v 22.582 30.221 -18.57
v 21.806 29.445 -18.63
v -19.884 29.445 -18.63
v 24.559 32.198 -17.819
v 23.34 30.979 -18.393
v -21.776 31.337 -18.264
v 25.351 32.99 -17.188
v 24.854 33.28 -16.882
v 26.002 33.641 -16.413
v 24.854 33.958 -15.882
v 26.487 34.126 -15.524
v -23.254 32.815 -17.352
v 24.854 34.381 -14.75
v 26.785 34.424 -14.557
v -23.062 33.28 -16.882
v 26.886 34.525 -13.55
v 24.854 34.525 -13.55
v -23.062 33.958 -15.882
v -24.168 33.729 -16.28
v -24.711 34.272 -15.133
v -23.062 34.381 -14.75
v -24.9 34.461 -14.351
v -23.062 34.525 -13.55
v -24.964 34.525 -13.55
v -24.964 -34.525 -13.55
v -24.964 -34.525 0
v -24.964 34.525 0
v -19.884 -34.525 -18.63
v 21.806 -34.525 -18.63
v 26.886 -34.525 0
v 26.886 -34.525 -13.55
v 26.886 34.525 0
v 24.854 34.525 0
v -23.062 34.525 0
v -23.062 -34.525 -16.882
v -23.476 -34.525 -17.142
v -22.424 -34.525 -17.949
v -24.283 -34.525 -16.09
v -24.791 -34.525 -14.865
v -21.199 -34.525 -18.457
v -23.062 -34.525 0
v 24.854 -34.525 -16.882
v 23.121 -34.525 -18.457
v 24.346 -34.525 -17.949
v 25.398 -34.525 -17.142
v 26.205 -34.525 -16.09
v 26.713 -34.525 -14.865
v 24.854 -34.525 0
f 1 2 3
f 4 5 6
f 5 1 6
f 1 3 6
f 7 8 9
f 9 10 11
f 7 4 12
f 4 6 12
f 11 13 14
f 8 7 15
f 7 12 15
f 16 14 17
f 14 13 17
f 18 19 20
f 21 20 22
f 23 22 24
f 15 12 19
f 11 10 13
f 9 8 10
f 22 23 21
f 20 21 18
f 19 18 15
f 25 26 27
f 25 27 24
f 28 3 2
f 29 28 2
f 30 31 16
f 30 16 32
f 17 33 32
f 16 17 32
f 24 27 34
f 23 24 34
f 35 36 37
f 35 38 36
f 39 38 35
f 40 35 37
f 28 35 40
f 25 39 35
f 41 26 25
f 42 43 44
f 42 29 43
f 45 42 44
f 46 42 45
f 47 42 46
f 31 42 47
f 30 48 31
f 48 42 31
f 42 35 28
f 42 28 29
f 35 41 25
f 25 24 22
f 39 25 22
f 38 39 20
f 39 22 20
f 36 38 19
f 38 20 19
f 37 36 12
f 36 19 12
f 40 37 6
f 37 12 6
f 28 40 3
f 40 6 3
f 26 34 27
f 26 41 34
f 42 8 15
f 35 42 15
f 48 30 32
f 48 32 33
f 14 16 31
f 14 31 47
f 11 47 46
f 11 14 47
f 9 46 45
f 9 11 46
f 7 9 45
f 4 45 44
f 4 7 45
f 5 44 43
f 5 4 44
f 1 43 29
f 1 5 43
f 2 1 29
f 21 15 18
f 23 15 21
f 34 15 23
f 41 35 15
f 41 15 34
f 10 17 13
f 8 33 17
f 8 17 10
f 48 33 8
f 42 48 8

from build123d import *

# Parameters (mm, degrees)
F1_DEPTH    = 34.52499953
F2_T1_DEPTH = 94.44999906
F2_T3_DEPTH = 77.25000044


# Not quite as in the source:
# - a fillet or chamfer that OpenCascade refuses, or shapes differently, is made with other operations: its cross-section is extruded or revolved along the edge and cut away or added


with BuildPart() as f1:
    # F0 (on Front) → F1 (new body, symmetric)
    with BuildSketch(Plane.XZ):
        Polygon((-24.9640439777, 0), (-24.9640439777, -18.630000078), (26.8859564623, -18.630000078), (26.8859564623, 0), (24.8539564623, 0), (24.8539564623, -16.881729), (-23.0624323377, -16.881729), (-23.0624323377, 0), align=None)
    extrude(amount=F1_DEPTH, both=True)

    # F2: fillet of radius 5.08 on 3 edges, made by hand

    # F2_s2 → F2_t1 (cut)
    with BuildSketch(Plane.XZ.offset(-47.22499953)):
        with BuildLine():
            ThreePointArc((26.8859564623, -13.550000078), (25.3980589107, -17.1421025264), (21.8059564623, -18.630000078))
            Line((21.8059564623, -18.630000078), (26.8859564623, -18.630000078))
            Line((26.8859564623, -18.630000078), (26.8859564623, -13.550000078))
        make_face()
        with BuildLine():
            ThreePointArc((-24.9640439777, -13.550000078), (-23.4761464261, -17.1421025264), (-19.8840439777, -18.630000078))
            Line((-19.8840439777, -18.630000078), (-24.9640439777, -18.630000078))
            Line((-24.9640439777, -18.630000078), (-24.9640439777, -13.550000078))
        make_face()
    extrude(amount=F2_T1_DEPTH, mode=Mode.SUBTRACT)

    # F2_s4 → F2_t3 (cut)
    with BuildSketch(Plane.YZ.offset(-37.6640439777)):
        with BuildLine():
            ThreePointArc((29.44499953, -18.630000078), (33.0371019784, -17.1421025264), (34.52499953, -13.550000078))
            Line((34.52499953, -13.550000078), (34.52499953, -18.630000078))
            Line((34.52499953, -18.630000078), (29.44499953, -18.630000078))
        make_face()
    extrude(amount=F2_T3_DEPTH, mode=Mode.SUBTRACT)


solid = f1.part
